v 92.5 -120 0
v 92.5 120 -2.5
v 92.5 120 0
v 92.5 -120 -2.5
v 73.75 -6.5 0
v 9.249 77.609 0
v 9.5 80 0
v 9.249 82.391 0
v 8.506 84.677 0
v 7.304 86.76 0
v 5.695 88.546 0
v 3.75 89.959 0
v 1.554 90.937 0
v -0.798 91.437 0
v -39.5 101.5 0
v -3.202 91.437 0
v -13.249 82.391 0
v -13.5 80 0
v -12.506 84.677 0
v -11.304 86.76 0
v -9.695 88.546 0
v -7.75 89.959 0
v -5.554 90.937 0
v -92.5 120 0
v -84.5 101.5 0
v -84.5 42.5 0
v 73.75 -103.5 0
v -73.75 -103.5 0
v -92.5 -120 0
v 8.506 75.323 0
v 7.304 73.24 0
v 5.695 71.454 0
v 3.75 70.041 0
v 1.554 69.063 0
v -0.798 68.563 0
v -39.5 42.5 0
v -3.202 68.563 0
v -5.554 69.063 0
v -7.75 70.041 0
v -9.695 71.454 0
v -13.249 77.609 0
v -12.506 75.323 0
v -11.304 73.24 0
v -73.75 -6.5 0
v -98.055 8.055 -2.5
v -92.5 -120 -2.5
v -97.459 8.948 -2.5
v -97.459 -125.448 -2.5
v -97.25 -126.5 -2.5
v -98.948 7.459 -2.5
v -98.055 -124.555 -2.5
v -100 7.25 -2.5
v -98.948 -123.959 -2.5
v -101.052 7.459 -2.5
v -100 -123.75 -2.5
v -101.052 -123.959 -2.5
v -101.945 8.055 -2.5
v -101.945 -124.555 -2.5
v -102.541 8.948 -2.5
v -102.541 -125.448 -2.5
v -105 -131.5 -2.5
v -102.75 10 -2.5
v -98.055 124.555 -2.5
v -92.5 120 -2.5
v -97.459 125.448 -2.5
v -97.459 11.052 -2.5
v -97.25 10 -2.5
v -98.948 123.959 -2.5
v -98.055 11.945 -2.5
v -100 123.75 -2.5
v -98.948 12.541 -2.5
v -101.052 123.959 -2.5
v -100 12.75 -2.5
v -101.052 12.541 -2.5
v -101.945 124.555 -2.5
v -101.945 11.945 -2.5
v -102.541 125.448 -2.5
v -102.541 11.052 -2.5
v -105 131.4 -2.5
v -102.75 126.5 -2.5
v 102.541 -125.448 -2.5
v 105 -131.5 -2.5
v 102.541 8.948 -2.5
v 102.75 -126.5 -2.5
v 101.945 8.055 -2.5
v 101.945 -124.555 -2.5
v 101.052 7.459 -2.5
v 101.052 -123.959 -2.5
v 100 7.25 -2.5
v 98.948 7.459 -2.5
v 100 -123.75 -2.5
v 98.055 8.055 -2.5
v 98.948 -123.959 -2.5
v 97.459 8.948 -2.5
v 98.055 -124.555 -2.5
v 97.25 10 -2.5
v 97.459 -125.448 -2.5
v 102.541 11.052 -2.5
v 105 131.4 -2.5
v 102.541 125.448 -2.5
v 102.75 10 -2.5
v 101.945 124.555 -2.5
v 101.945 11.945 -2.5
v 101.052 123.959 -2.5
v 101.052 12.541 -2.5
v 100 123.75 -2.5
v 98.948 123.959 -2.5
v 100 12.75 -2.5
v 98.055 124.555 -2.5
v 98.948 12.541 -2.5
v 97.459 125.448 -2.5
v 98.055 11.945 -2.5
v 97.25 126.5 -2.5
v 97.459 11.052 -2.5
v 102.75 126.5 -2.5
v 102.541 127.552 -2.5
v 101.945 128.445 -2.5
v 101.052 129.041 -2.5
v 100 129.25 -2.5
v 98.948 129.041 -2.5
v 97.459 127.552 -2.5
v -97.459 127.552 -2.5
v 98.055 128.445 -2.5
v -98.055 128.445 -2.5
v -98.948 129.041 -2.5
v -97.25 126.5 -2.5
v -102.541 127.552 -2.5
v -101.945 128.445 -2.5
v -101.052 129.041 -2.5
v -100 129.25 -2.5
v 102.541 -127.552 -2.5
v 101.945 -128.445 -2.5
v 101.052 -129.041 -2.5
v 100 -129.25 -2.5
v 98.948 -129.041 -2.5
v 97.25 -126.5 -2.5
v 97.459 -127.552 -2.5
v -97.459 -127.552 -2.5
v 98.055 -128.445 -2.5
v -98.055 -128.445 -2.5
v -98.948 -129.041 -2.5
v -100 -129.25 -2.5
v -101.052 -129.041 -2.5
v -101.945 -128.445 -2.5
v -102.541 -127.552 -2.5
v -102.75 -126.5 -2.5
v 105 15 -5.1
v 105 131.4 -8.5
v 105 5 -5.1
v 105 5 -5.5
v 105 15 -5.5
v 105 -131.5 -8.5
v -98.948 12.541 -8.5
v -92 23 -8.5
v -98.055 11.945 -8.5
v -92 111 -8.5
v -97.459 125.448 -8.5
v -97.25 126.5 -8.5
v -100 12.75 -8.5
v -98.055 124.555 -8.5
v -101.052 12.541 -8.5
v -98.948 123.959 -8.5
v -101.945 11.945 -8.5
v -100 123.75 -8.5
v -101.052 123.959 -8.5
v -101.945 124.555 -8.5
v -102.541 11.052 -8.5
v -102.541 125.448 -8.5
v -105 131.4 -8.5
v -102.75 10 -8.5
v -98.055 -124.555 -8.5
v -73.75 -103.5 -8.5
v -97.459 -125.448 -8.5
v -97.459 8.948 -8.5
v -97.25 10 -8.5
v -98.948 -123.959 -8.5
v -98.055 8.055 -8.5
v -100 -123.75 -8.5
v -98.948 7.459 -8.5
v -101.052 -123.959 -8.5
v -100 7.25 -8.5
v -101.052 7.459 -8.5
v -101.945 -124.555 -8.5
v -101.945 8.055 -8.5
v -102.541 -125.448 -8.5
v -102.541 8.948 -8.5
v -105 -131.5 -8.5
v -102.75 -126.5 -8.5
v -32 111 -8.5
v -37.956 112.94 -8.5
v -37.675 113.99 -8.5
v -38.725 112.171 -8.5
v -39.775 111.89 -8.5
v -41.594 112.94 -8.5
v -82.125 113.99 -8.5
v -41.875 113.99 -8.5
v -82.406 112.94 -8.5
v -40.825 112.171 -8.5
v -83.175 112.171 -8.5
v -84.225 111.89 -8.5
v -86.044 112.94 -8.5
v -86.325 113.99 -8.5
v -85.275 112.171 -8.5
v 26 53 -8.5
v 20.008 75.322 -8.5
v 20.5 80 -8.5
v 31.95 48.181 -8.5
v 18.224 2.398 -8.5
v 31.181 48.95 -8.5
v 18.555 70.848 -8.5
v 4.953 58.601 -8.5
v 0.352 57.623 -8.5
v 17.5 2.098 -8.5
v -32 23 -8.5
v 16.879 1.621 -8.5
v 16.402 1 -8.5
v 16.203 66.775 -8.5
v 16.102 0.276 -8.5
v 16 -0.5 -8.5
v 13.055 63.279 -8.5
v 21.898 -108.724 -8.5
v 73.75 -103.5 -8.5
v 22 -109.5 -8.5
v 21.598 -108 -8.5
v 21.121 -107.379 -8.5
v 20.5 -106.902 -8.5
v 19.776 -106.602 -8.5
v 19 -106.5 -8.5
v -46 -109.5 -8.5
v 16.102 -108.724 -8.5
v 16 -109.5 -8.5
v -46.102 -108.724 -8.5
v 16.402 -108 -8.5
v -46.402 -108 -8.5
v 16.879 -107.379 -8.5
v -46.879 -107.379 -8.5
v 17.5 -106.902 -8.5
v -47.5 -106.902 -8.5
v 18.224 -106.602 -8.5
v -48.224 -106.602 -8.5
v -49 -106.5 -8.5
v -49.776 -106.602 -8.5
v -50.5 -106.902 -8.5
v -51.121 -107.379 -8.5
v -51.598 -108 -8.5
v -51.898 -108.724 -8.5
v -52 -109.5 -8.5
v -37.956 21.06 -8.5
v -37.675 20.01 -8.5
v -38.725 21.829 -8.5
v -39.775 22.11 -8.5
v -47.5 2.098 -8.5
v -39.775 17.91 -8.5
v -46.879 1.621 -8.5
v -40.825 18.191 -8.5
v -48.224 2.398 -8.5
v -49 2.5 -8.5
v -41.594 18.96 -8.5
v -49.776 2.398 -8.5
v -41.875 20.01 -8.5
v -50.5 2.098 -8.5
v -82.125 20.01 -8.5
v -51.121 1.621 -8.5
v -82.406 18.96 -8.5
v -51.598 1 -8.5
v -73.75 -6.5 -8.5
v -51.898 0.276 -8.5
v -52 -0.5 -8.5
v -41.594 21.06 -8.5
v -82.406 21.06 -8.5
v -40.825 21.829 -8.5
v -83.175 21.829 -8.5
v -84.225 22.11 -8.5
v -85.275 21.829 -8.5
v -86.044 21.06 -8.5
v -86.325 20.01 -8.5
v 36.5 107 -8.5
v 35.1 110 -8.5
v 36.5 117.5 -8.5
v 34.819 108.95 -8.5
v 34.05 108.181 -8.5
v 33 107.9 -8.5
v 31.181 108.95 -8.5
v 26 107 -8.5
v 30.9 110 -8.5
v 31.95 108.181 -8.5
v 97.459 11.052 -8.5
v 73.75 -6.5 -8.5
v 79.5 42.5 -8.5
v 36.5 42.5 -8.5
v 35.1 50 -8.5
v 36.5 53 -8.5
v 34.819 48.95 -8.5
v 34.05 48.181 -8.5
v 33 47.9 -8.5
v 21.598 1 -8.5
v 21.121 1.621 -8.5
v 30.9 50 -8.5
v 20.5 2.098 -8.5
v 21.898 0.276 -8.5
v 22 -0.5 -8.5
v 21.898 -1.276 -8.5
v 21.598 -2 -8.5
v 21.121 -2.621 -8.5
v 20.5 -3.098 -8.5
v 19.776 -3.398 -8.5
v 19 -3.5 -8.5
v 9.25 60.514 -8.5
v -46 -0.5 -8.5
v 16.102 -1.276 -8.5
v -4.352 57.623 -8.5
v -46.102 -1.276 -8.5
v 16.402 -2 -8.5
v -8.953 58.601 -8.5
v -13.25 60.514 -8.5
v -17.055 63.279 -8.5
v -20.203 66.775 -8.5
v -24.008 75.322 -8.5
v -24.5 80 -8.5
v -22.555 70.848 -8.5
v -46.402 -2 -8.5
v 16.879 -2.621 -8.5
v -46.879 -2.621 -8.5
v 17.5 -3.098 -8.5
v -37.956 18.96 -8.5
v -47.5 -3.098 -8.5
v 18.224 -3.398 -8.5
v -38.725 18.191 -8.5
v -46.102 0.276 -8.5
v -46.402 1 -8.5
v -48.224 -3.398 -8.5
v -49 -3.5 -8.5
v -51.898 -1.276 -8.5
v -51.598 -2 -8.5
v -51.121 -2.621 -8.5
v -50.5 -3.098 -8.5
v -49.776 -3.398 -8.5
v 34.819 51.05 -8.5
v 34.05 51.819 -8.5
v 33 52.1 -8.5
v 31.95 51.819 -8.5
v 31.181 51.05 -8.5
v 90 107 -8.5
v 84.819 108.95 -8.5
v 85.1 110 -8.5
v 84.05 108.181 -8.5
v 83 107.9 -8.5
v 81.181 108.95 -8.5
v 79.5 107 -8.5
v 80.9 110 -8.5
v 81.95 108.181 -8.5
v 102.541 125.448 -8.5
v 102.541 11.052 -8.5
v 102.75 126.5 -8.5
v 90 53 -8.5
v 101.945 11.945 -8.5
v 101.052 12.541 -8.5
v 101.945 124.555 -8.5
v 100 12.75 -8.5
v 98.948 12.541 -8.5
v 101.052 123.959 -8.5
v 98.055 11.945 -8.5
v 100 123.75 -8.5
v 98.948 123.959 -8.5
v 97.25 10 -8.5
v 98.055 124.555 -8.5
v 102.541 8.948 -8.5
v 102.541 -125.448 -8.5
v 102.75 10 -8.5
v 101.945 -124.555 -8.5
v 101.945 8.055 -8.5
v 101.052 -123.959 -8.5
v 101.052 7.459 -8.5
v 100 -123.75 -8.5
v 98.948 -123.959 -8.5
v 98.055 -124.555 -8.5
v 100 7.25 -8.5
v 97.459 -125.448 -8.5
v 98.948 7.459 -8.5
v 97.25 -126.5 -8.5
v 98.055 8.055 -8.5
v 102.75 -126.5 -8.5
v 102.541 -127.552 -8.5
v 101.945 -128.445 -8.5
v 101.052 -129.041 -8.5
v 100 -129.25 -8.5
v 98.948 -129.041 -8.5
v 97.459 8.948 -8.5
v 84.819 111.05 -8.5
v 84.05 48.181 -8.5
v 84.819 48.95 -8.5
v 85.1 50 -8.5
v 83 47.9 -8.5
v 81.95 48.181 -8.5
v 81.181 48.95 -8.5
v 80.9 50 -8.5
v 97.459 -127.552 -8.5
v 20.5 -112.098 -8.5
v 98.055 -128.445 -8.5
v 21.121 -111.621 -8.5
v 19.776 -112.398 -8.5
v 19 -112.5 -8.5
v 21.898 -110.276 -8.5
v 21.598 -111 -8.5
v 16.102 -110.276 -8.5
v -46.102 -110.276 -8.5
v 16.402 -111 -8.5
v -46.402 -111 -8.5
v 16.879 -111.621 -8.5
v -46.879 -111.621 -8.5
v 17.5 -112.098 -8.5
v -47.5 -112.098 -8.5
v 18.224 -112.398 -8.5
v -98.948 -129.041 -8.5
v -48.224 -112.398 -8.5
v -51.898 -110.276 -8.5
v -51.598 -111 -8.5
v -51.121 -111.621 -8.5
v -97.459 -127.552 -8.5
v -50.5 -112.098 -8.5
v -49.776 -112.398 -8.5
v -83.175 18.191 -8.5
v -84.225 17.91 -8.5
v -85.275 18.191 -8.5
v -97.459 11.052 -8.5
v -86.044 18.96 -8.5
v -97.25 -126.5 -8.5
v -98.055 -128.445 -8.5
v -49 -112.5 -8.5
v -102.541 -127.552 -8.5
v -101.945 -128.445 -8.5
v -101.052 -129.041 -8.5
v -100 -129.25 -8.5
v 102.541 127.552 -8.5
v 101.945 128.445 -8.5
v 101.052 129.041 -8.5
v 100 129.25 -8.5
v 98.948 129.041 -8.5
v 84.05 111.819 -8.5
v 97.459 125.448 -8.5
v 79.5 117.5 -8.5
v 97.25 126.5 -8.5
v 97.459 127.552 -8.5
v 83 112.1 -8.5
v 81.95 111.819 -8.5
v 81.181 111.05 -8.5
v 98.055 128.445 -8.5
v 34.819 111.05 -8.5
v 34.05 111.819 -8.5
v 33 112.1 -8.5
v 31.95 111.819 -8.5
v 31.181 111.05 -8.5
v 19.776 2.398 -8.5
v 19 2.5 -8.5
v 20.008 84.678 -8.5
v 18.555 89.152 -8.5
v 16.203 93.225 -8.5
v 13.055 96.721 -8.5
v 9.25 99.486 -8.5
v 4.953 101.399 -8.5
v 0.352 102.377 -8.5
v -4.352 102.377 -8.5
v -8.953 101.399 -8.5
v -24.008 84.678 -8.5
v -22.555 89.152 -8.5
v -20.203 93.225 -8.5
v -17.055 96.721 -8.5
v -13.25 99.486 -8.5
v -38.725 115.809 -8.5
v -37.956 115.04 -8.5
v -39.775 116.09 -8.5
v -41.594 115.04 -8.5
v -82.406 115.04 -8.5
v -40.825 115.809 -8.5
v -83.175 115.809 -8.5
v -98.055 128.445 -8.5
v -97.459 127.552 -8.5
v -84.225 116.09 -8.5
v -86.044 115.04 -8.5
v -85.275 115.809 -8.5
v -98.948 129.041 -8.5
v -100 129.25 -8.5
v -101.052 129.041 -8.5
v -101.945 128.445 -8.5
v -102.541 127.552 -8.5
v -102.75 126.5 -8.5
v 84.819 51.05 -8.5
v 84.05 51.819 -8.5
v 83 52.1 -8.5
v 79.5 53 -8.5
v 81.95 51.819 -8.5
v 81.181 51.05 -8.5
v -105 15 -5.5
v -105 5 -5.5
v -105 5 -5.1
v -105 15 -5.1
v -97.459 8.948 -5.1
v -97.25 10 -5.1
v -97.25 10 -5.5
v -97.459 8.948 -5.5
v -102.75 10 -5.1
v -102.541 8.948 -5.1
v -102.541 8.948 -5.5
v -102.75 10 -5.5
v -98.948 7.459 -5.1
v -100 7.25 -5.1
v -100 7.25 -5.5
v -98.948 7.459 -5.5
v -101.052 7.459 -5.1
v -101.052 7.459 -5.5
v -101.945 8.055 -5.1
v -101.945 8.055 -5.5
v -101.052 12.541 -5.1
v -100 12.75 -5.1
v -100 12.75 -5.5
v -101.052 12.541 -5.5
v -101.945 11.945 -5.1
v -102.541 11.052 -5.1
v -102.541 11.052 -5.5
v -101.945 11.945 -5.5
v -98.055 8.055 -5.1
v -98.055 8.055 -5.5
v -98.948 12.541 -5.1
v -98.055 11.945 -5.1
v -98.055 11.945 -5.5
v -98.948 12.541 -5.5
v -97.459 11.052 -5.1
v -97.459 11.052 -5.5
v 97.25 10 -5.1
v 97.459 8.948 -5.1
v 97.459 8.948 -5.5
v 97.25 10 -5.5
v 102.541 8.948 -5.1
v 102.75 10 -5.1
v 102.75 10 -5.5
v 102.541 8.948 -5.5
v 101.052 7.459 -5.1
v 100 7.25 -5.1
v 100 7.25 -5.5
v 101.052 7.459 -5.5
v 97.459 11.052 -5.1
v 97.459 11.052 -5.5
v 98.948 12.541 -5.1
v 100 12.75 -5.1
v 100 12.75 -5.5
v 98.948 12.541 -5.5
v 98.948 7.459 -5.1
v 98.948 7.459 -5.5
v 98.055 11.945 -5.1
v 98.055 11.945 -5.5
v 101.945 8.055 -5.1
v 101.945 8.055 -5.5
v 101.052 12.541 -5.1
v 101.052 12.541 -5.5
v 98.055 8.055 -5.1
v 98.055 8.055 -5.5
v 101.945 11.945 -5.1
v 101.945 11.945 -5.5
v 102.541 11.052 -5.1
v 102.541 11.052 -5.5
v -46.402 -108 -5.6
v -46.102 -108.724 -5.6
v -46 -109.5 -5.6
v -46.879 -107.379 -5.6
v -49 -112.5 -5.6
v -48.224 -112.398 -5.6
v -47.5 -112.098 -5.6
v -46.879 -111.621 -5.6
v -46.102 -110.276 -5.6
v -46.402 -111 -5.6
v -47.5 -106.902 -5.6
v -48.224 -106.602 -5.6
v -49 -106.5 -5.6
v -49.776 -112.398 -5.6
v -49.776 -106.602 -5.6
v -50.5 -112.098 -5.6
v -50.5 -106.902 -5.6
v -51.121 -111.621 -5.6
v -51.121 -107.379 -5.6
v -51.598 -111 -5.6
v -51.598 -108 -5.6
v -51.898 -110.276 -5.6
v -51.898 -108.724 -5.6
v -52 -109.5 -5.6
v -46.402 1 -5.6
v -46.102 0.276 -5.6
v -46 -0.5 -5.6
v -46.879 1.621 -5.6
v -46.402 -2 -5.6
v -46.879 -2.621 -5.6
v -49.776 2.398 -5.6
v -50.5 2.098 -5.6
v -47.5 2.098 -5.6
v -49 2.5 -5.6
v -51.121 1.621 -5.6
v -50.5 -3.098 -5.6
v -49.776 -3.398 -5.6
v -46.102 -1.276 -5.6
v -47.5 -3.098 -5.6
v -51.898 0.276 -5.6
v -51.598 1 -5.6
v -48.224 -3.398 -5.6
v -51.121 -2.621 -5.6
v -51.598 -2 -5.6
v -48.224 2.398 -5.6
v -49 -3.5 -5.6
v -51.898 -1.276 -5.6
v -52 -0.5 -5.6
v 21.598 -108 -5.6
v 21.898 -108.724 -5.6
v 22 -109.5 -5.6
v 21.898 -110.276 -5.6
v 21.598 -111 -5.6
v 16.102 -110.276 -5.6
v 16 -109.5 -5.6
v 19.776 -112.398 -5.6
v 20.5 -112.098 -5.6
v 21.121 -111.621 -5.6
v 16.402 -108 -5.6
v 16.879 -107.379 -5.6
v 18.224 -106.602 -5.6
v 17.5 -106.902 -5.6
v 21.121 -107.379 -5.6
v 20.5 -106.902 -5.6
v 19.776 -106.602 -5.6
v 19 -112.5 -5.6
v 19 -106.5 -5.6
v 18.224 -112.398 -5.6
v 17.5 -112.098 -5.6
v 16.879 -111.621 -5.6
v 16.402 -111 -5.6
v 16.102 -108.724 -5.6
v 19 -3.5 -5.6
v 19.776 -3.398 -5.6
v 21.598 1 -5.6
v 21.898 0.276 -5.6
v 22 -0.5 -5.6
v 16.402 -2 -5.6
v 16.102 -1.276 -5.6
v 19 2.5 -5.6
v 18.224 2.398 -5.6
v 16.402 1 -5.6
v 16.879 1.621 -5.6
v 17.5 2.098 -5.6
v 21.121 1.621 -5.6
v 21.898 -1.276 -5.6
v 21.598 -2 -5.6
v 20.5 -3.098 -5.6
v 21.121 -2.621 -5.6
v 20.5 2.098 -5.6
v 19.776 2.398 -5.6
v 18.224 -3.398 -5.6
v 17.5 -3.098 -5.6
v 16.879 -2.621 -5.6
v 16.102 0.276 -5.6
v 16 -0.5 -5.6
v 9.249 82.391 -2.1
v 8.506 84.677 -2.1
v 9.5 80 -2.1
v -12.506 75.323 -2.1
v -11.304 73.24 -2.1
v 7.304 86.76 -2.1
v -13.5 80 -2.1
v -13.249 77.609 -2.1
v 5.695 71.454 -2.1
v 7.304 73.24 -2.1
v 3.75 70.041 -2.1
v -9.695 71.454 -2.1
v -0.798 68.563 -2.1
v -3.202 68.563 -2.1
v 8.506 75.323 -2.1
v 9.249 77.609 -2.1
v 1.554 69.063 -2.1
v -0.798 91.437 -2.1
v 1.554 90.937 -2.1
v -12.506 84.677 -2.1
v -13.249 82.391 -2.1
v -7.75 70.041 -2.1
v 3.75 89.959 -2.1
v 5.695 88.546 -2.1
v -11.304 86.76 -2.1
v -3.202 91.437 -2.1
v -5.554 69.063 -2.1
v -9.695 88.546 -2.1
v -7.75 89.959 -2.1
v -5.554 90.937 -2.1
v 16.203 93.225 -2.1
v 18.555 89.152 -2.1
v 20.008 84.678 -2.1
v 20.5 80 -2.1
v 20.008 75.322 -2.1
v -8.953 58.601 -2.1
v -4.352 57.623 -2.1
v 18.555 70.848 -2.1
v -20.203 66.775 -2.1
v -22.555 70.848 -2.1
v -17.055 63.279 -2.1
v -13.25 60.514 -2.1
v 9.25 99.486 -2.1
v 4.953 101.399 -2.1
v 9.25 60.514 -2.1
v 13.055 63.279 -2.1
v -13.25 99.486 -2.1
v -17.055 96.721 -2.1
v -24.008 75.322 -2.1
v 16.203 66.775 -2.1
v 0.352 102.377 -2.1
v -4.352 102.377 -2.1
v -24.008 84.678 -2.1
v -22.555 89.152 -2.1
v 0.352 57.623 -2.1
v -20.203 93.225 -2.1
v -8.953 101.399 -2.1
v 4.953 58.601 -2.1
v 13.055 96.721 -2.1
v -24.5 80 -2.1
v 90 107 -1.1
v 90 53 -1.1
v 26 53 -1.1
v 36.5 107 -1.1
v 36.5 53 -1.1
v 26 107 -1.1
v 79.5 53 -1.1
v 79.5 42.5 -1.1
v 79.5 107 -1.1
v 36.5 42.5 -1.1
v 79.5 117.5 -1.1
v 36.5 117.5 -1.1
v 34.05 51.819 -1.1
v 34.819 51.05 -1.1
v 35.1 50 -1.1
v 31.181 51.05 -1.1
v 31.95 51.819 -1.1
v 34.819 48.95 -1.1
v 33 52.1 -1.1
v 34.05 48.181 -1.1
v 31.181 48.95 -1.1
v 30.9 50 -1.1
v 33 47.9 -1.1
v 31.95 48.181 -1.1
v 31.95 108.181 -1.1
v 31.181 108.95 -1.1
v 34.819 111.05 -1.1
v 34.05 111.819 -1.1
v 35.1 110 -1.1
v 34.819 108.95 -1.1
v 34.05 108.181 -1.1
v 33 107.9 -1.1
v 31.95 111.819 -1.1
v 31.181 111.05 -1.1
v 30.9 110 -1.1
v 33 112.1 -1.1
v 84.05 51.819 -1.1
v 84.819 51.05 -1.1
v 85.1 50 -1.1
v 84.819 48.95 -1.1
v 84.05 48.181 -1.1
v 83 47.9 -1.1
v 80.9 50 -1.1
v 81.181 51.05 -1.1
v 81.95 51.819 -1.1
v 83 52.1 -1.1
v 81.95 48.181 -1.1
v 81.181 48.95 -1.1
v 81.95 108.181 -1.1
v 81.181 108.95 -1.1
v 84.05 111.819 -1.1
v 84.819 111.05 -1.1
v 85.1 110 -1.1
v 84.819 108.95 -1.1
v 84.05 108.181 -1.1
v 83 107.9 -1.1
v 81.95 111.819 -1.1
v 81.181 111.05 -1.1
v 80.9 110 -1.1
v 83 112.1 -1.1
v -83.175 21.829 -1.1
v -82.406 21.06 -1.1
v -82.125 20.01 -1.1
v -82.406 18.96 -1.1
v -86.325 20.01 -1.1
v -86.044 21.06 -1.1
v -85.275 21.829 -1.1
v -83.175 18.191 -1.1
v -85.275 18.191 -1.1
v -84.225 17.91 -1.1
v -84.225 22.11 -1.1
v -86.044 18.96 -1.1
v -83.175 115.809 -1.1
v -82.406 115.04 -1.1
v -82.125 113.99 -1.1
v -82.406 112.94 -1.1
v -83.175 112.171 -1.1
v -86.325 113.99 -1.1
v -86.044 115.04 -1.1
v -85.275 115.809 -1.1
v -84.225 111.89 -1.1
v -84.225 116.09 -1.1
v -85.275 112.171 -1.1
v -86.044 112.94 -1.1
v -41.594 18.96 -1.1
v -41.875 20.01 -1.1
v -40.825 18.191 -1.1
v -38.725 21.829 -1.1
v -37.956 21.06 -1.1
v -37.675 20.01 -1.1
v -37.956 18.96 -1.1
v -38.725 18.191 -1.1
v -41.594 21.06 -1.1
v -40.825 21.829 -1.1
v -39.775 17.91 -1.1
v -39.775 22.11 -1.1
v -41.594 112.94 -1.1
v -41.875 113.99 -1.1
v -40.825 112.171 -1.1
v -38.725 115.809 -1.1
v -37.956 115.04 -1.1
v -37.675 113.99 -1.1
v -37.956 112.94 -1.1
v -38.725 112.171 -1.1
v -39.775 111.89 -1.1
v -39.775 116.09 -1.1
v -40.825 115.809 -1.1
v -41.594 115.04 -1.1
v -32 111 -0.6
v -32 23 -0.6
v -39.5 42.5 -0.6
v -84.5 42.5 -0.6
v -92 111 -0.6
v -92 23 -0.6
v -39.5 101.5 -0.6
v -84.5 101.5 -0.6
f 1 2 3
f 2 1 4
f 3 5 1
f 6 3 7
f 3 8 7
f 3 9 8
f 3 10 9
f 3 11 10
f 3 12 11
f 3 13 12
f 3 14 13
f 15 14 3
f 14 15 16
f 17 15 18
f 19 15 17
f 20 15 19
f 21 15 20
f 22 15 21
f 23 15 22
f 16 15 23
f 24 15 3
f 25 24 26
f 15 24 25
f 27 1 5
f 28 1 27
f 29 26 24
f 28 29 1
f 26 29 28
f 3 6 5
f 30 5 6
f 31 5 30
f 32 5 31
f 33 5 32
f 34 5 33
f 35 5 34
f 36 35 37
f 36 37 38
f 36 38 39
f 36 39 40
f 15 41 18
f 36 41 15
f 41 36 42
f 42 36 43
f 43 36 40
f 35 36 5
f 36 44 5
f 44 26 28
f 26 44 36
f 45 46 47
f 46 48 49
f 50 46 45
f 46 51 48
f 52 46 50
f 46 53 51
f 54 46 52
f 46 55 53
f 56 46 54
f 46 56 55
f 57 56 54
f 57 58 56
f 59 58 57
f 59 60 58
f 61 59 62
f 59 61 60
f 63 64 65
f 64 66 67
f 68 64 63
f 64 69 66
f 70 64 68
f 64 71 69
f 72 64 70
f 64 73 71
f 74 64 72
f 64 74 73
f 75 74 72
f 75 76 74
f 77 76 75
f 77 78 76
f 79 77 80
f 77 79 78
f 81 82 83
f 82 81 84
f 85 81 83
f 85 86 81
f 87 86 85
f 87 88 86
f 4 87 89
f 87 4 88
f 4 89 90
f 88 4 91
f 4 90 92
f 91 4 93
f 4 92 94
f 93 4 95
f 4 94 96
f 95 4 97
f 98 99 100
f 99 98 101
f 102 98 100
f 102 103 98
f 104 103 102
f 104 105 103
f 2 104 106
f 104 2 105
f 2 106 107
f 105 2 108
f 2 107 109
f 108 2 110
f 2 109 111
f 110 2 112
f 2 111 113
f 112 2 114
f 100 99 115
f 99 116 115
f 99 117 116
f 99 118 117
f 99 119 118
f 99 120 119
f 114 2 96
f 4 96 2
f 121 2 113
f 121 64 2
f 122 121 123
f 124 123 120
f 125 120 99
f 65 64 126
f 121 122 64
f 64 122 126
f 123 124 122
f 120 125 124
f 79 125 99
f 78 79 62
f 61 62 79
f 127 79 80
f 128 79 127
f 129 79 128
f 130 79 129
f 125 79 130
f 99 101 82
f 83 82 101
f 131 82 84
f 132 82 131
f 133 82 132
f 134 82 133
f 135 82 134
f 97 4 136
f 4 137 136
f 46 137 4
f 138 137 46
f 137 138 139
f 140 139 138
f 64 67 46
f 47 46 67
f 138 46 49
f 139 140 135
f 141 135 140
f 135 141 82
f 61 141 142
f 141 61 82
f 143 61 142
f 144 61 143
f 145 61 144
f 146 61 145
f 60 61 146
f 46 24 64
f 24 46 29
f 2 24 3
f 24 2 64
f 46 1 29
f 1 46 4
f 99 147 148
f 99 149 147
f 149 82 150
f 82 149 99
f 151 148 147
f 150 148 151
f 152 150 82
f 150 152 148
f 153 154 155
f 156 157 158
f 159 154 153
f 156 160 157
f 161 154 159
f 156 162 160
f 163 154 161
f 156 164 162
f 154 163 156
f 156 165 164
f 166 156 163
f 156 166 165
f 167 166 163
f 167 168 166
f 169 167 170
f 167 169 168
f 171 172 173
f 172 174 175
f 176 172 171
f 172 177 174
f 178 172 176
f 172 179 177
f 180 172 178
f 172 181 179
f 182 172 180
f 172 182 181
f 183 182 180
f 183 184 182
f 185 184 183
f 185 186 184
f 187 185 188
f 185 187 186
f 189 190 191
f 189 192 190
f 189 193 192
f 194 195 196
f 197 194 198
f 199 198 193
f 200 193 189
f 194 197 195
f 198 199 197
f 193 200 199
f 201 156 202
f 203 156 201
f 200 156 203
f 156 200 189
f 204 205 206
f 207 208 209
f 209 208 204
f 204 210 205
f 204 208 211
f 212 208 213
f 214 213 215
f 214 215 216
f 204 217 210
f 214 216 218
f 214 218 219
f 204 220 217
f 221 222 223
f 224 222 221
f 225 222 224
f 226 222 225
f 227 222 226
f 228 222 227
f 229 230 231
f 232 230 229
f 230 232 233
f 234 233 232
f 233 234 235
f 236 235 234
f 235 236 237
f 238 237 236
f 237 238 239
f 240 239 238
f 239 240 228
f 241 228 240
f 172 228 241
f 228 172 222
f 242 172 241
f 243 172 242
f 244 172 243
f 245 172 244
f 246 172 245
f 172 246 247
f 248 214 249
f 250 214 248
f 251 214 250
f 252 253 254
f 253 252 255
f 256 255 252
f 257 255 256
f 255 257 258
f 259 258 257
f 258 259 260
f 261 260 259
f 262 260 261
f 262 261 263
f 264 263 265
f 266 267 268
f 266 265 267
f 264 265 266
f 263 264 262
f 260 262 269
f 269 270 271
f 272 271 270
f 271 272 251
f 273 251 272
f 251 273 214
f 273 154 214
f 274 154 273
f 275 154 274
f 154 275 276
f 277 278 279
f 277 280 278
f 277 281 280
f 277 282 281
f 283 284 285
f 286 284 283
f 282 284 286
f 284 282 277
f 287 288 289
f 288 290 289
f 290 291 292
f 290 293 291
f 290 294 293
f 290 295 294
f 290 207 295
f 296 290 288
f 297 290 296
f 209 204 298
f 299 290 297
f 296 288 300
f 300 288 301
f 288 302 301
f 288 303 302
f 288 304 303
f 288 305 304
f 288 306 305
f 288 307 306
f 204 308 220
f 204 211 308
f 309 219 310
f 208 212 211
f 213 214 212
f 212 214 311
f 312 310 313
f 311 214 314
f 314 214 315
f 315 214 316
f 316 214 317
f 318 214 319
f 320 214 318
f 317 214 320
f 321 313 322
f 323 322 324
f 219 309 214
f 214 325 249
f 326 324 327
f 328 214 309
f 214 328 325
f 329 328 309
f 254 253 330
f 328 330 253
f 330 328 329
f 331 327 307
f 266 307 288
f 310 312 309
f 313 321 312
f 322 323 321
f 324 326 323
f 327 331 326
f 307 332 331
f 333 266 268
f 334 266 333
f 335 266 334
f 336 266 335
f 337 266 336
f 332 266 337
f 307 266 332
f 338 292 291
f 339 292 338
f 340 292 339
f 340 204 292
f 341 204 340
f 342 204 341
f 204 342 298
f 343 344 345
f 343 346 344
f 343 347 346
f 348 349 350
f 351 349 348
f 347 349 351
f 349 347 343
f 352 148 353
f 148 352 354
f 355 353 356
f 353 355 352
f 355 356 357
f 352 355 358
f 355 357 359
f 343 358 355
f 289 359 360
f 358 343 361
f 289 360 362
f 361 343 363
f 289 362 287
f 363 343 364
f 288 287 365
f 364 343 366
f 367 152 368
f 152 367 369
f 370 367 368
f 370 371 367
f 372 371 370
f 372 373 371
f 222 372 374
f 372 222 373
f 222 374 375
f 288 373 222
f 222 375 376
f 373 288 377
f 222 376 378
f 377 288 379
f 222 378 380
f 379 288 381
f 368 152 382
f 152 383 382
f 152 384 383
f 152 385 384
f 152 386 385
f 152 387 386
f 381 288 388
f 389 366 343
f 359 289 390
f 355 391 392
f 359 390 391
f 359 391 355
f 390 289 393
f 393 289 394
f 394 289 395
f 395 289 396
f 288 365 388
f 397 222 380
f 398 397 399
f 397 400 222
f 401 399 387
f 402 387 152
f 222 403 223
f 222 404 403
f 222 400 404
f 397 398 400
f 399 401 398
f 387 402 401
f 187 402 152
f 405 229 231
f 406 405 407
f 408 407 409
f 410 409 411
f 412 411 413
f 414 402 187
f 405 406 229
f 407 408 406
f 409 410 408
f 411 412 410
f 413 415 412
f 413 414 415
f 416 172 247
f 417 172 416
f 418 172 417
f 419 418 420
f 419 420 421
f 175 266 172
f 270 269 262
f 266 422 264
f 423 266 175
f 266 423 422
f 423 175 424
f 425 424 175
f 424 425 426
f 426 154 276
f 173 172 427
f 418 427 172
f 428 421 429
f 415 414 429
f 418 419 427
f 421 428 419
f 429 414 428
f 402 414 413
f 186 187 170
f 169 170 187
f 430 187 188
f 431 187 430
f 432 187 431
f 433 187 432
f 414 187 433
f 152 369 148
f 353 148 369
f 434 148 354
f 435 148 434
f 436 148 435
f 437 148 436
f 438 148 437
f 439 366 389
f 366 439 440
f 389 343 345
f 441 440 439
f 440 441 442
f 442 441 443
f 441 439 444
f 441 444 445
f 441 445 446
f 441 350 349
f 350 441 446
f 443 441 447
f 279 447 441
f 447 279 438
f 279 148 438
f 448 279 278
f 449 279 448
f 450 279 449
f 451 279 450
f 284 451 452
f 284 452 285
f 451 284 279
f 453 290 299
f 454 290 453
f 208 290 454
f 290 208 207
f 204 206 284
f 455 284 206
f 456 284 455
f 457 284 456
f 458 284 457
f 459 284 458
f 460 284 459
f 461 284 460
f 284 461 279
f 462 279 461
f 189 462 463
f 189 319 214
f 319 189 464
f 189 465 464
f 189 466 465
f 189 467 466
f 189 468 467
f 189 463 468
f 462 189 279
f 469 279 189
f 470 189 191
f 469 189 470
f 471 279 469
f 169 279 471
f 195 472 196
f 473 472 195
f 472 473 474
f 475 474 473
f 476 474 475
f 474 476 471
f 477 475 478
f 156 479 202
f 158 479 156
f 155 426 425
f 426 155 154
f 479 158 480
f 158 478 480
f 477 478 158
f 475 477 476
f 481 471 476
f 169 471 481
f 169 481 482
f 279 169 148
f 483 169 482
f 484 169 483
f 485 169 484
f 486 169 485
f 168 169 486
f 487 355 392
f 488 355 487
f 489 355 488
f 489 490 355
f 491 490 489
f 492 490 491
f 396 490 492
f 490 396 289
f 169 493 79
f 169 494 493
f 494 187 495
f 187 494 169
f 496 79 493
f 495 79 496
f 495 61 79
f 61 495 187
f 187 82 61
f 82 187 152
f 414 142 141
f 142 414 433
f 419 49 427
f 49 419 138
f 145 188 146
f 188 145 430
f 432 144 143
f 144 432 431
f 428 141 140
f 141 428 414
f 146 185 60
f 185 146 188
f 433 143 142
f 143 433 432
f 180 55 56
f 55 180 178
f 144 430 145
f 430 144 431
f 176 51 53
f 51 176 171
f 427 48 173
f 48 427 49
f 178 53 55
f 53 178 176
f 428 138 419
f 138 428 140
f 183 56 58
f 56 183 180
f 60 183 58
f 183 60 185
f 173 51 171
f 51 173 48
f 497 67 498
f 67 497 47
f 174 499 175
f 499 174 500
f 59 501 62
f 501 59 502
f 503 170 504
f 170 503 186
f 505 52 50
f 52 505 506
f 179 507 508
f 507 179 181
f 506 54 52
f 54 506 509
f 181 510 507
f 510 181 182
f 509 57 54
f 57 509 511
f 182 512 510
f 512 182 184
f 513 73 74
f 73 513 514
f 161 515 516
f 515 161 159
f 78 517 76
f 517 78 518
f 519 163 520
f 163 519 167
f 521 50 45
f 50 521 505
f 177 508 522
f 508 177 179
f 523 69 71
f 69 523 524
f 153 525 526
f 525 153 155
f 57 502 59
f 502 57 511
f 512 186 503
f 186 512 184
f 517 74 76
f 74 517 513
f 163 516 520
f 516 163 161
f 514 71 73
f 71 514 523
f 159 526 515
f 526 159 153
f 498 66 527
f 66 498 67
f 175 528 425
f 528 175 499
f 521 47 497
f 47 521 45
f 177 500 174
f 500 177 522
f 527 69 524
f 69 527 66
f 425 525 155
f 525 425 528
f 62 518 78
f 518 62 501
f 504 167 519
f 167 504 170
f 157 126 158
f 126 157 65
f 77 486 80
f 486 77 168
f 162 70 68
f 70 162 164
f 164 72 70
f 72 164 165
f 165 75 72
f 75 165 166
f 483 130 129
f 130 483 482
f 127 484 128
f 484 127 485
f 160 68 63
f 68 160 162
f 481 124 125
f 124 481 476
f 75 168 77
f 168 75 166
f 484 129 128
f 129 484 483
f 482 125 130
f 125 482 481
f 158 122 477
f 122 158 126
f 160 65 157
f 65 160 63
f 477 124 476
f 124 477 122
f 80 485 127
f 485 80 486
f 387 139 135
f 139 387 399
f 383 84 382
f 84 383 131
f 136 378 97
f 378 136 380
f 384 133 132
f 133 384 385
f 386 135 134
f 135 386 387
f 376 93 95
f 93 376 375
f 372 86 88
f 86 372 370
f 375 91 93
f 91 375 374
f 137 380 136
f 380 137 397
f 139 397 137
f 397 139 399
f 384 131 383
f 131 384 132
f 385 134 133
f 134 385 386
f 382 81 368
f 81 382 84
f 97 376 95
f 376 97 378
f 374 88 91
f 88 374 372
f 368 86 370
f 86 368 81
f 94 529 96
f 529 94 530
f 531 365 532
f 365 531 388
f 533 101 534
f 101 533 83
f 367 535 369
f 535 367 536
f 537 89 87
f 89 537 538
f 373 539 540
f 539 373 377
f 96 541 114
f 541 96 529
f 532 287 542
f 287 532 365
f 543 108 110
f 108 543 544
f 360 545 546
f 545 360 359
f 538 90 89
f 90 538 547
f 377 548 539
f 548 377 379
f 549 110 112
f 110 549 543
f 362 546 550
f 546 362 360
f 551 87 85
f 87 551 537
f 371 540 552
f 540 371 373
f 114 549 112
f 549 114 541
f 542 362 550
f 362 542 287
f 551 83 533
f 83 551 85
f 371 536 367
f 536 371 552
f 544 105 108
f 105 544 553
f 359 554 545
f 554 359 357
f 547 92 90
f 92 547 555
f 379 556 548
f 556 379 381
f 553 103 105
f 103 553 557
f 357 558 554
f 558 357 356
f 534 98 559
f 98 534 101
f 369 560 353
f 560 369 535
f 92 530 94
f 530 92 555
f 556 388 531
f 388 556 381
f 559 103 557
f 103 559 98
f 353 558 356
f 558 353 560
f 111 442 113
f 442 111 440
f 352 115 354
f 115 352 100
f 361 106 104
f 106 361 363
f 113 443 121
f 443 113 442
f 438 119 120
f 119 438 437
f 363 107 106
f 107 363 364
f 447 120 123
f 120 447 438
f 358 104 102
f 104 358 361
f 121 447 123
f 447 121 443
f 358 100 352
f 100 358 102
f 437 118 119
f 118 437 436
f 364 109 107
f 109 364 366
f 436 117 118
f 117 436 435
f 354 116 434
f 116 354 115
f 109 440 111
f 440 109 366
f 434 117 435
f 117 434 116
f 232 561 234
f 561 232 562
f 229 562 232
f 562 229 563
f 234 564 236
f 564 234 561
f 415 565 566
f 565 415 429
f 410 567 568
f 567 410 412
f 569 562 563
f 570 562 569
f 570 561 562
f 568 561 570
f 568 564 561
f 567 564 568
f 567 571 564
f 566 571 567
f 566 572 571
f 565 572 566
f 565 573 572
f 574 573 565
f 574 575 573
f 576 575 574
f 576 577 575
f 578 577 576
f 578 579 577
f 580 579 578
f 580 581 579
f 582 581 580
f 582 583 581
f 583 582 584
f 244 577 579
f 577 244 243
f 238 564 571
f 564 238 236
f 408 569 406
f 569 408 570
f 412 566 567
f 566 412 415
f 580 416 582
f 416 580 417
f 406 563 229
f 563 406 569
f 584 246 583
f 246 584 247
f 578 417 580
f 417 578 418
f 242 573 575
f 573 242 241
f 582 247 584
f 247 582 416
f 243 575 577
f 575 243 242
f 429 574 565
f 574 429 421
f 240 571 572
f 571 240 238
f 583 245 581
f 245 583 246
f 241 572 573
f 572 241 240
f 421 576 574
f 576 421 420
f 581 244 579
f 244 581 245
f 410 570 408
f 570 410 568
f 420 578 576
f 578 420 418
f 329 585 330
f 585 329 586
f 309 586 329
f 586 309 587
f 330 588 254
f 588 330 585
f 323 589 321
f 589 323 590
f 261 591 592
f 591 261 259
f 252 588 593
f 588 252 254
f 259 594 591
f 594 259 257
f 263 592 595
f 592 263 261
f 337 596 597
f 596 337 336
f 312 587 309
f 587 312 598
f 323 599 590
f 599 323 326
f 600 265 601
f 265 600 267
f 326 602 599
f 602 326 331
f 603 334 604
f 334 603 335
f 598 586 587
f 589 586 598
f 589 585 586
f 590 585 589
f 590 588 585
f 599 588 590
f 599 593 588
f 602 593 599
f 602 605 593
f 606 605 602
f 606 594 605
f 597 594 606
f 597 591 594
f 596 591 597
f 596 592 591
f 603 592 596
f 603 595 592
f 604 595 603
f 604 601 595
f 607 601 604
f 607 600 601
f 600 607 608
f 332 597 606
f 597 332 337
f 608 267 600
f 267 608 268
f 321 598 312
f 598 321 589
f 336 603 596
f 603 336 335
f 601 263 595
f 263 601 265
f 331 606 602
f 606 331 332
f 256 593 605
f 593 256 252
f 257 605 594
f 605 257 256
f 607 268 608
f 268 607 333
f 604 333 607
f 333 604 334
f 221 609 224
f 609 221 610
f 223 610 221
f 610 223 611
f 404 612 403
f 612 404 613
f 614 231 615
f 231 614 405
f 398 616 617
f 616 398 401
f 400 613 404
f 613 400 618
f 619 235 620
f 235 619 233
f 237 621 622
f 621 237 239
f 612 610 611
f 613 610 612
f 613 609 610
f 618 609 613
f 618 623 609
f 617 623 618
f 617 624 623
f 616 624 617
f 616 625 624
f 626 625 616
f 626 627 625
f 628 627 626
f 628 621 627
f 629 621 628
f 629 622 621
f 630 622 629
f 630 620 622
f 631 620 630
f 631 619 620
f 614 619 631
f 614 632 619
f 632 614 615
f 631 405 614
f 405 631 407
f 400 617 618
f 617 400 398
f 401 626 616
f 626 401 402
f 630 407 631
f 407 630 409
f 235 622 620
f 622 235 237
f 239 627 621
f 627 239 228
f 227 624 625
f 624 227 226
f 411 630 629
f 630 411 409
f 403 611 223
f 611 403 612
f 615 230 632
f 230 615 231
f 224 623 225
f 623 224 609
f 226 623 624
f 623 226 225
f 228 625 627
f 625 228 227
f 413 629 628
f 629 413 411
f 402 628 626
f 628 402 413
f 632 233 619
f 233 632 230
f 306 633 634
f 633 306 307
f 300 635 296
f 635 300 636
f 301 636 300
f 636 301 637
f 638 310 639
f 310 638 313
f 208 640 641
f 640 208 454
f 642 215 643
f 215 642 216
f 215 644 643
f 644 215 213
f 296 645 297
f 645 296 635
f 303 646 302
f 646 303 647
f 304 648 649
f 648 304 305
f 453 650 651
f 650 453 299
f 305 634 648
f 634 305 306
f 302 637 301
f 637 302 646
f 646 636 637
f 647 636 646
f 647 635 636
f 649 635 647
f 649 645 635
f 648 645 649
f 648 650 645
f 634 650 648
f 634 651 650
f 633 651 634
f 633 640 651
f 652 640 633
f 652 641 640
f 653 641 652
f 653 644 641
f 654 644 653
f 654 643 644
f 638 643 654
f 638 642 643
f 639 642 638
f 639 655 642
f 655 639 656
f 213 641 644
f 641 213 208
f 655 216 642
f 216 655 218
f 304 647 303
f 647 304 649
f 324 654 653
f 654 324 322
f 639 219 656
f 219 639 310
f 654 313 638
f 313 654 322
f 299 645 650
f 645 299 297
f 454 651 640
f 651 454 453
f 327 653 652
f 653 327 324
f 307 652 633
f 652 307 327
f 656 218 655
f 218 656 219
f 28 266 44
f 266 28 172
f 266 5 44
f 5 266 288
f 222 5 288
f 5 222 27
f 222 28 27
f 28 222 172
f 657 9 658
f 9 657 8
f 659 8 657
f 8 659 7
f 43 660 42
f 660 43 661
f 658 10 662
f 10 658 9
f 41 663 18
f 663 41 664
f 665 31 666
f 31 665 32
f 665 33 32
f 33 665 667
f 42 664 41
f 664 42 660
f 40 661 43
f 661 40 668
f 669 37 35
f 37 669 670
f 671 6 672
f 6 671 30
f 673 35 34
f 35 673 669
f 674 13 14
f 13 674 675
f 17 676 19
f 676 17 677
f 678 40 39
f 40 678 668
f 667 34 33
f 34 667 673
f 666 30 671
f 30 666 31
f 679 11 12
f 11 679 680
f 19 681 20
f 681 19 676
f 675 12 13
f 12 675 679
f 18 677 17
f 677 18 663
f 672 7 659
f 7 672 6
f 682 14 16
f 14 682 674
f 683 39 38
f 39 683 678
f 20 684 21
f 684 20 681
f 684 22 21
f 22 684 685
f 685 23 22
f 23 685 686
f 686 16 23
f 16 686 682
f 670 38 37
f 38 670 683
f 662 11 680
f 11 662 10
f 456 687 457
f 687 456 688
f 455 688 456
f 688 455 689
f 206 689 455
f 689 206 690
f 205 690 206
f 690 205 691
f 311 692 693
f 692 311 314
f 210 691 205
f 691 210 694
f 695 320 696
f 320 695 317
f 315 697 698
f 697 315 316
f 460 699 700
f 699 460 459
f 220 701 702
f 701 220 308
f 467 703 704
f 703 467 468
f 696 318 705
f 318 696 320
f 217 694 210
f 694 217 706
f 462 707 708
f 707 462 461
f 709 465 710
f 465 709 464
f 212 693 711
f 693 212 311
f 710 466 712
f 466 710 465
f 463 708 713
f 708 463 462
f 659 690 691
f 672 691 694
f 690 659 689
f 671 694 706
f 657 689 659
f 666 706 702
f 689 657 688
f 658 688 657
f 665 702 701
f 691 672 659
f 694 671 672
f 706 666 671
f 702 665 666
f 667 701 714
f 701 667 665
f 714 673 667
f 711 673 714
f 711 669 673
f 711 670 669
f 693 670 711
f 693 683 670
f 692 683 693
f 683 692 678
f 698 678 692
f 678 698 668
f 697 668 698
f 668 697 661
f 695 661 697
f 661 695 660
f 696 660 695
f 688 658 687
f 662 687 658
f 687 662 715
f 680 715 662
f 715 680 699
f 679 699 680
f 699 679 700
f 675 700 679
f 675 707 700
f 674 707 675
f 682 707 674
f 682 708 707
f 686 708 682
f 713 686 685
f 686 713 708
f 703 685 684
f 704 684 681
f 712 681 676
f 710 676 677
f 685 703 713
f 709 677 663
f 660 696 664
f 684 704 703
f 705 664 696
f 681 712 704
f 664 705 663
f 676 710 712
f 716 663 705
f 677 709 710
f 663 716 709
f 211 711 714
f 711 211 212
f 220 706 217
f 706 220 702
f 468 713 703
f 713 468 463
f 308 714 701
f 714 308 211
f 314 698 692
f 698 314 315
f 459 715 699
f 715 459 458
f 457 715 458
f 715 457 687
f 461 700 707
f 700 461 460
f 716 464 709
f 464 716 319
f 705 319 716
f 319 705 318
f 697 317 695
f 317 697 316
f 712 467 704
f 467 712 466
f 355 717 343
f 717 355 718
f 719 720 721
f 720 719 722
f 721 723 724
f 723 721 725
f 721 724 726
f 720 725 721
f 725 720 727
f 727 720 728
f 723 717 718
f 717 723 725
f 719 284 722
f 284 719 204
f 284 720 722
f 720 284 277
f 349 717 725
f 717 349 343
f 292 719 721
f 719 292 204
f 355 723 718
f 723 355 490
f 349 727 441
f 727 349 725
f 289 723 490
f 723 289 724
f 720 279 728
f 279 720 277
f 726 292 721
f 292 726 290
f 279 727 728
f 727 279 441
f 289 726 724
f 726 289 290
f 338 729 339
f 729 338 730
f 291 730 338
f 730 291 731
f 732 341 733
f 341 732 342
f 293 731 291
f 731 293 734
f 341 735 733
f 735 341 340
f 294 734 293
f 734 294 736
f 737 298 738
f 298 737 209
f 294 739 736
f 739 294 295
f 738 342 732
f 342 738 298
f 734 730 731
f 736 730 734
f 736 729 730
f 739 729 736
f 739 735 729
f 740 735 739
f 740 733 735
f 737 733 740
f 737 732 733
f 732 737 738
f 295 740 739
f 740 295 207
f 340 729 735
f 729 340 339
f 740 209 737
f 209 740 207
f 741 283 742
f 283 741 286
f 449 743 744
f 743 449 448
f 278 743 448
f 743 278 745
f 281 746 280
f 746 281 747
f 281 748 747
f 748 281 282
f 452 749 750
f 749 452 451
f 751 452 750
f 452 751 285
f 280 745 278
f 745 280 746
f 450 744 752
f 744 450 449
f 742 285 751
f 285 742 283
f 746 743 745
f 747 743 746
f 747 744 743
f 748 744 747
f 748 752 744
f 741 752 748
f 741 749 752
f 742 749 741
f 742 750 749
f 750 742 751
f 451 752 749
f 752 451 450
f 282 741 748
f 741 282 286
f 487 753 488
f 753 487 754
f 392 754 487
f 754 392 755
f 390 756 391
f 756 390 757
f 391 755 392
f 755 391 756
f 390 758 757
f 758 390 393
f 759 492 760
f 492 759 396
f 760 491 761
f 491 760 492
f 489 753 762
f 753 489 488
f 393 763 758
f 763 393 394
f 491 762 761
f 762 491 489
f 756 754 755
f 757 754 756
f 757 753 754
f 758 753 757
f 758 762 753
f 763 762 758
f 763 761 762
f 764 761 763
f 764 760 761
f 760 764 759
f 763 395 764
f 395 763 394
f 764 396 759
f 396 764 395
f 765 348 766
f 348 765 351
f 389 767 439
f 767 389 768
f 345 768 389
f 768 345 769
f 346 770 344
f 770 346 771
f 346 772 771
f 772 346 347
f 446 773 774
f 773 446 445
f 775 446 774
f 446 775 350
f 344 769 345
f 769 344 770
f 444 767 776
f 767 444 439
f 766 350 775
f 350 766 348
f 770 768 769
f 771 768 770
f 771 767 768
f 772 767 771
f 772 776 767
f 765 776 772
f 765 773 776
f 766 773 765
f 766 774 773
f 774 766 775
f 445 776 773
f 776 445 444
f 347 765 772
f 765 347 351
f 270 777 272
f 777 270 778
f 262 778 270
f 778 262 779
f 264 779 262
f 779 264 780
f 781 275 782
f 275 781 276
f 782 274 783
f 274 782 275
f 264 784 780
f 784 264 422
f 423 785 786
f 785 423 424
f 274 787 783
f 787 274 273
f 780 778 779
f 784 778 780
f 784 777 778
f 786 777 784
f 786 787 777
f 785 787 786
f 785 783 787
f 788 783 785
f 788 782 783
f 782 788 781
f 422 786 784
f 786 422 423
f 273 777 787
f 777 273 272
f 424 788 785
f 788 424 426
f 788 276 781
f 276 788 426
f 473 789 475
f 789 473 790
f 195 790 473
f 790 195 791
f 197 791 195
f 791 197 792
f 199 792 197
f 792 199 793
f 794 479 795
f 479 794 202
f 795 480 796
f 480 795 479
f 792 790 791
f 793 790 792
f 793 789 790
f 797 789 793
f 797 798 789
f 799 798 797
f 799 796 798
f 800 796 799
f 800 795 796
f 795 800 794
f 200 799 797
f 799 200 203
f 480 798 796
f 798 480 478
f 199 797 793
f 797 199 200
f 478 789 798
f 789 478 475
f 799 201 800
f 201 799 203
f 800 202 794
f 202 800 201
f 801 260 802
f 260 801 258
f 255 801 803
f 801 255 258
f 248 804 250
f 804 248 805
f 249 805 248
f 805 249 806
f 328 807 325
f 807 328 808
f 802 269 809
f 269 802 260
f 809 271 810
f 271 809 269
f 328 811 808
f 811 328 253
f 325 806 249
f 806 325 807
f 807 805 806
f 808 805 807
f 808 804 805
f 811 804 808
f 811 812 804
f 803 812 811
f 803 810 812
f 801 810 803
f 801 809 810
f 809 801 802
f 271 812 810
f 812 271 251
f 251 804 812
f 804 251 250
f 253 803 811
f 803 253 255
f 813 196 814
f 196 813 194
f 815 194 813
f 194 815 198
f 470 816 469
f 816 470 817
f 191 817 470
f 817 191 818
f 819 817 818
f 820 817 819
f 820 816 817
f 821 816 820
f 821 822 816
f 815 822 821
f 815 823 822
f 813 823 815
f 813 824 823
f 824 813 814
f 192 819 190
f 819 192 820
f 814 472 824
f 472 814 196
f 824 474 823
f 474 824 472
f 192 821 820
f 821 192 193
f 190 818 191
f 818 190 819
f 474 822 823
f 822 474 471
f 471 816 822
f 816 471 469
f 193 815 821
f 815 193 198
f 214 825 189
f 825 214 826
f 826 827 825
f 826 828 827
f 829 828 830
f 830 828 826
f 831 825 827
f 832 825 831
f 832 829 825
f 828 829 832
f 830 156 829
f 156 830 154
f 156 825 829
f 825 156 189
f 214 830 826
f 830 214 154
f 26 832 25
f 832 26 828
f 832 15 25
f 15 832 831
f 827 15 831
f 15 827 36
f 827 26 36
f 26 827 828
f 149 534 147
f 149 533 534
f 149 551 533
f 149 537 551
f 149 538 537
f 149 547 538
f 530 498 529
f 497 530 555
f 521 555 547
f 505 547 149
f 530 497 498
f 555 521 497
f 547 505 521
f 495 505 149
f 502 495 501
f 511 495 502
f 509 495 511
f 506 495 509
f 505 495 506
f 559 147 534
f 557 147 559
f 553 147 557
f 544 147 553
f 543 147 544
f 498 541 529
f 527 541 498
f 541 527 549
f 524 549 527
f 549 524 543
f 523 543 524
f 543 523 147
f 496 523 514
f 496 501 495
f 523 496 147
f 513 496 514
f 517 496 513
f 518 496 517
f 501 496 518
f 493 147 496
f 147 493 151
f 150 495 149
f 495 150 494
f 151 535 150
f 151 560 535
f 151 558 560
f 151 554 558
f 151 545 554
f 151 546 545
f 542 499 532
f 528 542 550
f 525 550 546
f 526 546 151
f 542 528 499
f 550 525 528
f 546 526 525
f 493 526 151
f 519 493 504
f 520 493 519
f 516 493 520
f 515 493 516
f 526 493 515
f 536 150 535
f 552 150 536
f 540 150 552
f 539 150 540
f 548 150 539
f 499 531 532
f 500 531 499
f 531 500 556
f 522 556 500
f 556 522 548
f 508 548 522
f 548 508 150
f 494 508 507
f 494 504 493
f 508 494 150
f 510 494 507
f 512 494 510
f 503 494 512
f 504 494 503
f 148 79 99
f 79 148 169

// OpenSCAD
machine_panel_mounting_hole_size = 5.5;
machine_panel_mounting_hole_centres = [200, 253];

split_point_y = 10;
split_overlap = 10;

panel_size = machine_panel_mounting_hole_centres + [10, 10];
panel_thickness = 6;

panel_lip_size = [185, 240];
panel_lip_thickness = 2.5;

module place_at_centres(centres) {
	dx = centres[0] / 2;
	dy = centres[1] / 2;

	for(x = [-dx, dx]) {
		for(y = [-dy, dy]) {
			translate([x, y]) {
				children();
			}
		}
	}
}

module through_panel() {
	panel_depth = panel_lip_thickness + panel_thickness;

	translate([0, 0, -panel_depth - 0.1]) {
		linear_extrude(panel_depth + 0.2) {
			children();
		}
	}
}

module solid_panel() {
	// Top lip (to make the surface flush with the top of the metal body of the machine)
	translate([0, 0, -panel_lip_thickness / 2]) {
		cube([panel_lip_size[0], panel_lip_size[1], panel_lip_thickness], center = true);
	}

	// Main section of the panel
	translate([0, 0, -panel_lip_thickness - (panel_thickness / 2)]) {
		cube([panel_size[0], panel_size[1], panel_thickness], center = true);
	}
}

module full_panel() {
	difference() {
		solid_panel();
		
		// Panel mounting holes
		dx = machine_panel_mounting_hole_centres[0] / 2;
		dy = machine_panel_mounting_hole_centres[1] / 2;
		for(x = [-dx, dx]) {
			for(y = [-dy, split_point_y, dy]) {
				translate([x, y]) {
					through_panel() {
						circle(d = machine_panel_mounting_hole_size, $fn = 16);
					}
				}
			}
		}

		// Ruida HMI
		translate([0, -55]) {
			// Panel cutout
			through_panel() {
				square([147.5, 97], center = true);
			}

			// Guide/retention holes for panel mount bracket screws
			translate([-15, 0, -panel_thickness - panel_lip_thickness - 0.1]) {
				place_at_centres([68, 109]) {
					cylinder(h = 3, d = 6, $fn = 24);
				}
			}
		}

		// Emergency stop button
		translate([-2, 80]) {
			// Cutout
			through_panel() {
				circle(d = 23);
			}

			// Recess for retention nut
			translate([0, 0, -panel_thickness - panel_lip_thickness - 0.1]) {
				cylinder(h = panel_thickness + panel_lip_thickness - 2, d = 45);
			}
		}

		// Access controller
		translate([58, 80, -panel_thickness - panel_lip_thickness - 0.1]) {
			// Cutout
			d = panel_thickness + panel_lip_thickness - 1;
			translate([0, 0, d / 2]) {
				cube([64, 54, d], center = true);
				cube([43, 75, d], center = true);
			}
		
			// Mounting holes
			place_at_centres([50, 60]) {
				cylinder(h = panel_thickness + panel_lip_thickness - 1, d = 4.2, $fn = 12);
			}
		}

		// Machine HMI
		translate([-62, 72]) {
			// Display cutout
			through_panel() {
				square([45, 59], center = true);
			}

			// Mounting holes
			translate([0, -5, -panel_thickness - panel_lip_thickness - 0.1]) {
				d = panel_thickness + panel_lip_thickness - 0.5;
				translate([0, 0, d / 2]) {
					cube([60, 88, d], center = true);
				}
			
				place_at_centres([44.45, 93.98]) {
					cylinder(h = panel_thickness + panel_lip_thickness - 1, d = 4.2, $fn = 12);
				}
			}
		}
	}
}

module panel_split_lower() {
	y0 = split_point_y + (split_overlap / 2);
	y1 = split_point_y - (split_overlap / 2);
	y2 = -(panel_size[1] / 2) - 0.1;

	z0 = 0.1;
	z1 = -panel_lip_thickness - (panel_thickness / 2) + 0.4;
	z2 = -panel_lip_thickness - panel_thickness - 0.1;

	rotate([90, 0, 90]) {
		translate([0, 0, -(panel_size[0] / 2) - 0.1]) {
			linear_extrude(panel_size[0] + 0.2) {
				polygon(points = [
					[y0, z0],
					[y0, z1],
					[y1, z1],
					[y1, z2],
					[y2, z2],
					[y2, z0],
				]);
			}
		}
	}
}

module panel_split_upper() {
	y0 = split_point_y - (split_overlap / 2);
	y1 = split_point_y + (split_overlap / 2);
	y2 = (panel_size[1] / 2) - 0.1;

	z0 = 0.1;
	z1 = -panel_lip_thickness - (panel_thickness / 2);
	z2 = -panel_lip_thickness - panel_thickness - 0.1;

	rotate([90, 0, 90]) {
		translate([0, 0, -(panel_size[0] / 2) - 0.1]) {
			linear_extrude(panel_size[0] + 0.2) {
				polygon(points = [
					[y1, z0],
					[y2, z0],
					[y2, z2],
					[y0, z2],
					[y0, z1],
					[y1, z1],
				]);
			}
		}
	}
}

module panel_lower() {
	intersection() {
		full_panel();
		panel_split_lower();
	}
}

module panel_upper() {
	intersection() {
		full_panel();
		panel_split_upper();
	}
}

// full_panel();
color("red") {
	panel_lower();
}
color("green") {
	panel_upper();
}
